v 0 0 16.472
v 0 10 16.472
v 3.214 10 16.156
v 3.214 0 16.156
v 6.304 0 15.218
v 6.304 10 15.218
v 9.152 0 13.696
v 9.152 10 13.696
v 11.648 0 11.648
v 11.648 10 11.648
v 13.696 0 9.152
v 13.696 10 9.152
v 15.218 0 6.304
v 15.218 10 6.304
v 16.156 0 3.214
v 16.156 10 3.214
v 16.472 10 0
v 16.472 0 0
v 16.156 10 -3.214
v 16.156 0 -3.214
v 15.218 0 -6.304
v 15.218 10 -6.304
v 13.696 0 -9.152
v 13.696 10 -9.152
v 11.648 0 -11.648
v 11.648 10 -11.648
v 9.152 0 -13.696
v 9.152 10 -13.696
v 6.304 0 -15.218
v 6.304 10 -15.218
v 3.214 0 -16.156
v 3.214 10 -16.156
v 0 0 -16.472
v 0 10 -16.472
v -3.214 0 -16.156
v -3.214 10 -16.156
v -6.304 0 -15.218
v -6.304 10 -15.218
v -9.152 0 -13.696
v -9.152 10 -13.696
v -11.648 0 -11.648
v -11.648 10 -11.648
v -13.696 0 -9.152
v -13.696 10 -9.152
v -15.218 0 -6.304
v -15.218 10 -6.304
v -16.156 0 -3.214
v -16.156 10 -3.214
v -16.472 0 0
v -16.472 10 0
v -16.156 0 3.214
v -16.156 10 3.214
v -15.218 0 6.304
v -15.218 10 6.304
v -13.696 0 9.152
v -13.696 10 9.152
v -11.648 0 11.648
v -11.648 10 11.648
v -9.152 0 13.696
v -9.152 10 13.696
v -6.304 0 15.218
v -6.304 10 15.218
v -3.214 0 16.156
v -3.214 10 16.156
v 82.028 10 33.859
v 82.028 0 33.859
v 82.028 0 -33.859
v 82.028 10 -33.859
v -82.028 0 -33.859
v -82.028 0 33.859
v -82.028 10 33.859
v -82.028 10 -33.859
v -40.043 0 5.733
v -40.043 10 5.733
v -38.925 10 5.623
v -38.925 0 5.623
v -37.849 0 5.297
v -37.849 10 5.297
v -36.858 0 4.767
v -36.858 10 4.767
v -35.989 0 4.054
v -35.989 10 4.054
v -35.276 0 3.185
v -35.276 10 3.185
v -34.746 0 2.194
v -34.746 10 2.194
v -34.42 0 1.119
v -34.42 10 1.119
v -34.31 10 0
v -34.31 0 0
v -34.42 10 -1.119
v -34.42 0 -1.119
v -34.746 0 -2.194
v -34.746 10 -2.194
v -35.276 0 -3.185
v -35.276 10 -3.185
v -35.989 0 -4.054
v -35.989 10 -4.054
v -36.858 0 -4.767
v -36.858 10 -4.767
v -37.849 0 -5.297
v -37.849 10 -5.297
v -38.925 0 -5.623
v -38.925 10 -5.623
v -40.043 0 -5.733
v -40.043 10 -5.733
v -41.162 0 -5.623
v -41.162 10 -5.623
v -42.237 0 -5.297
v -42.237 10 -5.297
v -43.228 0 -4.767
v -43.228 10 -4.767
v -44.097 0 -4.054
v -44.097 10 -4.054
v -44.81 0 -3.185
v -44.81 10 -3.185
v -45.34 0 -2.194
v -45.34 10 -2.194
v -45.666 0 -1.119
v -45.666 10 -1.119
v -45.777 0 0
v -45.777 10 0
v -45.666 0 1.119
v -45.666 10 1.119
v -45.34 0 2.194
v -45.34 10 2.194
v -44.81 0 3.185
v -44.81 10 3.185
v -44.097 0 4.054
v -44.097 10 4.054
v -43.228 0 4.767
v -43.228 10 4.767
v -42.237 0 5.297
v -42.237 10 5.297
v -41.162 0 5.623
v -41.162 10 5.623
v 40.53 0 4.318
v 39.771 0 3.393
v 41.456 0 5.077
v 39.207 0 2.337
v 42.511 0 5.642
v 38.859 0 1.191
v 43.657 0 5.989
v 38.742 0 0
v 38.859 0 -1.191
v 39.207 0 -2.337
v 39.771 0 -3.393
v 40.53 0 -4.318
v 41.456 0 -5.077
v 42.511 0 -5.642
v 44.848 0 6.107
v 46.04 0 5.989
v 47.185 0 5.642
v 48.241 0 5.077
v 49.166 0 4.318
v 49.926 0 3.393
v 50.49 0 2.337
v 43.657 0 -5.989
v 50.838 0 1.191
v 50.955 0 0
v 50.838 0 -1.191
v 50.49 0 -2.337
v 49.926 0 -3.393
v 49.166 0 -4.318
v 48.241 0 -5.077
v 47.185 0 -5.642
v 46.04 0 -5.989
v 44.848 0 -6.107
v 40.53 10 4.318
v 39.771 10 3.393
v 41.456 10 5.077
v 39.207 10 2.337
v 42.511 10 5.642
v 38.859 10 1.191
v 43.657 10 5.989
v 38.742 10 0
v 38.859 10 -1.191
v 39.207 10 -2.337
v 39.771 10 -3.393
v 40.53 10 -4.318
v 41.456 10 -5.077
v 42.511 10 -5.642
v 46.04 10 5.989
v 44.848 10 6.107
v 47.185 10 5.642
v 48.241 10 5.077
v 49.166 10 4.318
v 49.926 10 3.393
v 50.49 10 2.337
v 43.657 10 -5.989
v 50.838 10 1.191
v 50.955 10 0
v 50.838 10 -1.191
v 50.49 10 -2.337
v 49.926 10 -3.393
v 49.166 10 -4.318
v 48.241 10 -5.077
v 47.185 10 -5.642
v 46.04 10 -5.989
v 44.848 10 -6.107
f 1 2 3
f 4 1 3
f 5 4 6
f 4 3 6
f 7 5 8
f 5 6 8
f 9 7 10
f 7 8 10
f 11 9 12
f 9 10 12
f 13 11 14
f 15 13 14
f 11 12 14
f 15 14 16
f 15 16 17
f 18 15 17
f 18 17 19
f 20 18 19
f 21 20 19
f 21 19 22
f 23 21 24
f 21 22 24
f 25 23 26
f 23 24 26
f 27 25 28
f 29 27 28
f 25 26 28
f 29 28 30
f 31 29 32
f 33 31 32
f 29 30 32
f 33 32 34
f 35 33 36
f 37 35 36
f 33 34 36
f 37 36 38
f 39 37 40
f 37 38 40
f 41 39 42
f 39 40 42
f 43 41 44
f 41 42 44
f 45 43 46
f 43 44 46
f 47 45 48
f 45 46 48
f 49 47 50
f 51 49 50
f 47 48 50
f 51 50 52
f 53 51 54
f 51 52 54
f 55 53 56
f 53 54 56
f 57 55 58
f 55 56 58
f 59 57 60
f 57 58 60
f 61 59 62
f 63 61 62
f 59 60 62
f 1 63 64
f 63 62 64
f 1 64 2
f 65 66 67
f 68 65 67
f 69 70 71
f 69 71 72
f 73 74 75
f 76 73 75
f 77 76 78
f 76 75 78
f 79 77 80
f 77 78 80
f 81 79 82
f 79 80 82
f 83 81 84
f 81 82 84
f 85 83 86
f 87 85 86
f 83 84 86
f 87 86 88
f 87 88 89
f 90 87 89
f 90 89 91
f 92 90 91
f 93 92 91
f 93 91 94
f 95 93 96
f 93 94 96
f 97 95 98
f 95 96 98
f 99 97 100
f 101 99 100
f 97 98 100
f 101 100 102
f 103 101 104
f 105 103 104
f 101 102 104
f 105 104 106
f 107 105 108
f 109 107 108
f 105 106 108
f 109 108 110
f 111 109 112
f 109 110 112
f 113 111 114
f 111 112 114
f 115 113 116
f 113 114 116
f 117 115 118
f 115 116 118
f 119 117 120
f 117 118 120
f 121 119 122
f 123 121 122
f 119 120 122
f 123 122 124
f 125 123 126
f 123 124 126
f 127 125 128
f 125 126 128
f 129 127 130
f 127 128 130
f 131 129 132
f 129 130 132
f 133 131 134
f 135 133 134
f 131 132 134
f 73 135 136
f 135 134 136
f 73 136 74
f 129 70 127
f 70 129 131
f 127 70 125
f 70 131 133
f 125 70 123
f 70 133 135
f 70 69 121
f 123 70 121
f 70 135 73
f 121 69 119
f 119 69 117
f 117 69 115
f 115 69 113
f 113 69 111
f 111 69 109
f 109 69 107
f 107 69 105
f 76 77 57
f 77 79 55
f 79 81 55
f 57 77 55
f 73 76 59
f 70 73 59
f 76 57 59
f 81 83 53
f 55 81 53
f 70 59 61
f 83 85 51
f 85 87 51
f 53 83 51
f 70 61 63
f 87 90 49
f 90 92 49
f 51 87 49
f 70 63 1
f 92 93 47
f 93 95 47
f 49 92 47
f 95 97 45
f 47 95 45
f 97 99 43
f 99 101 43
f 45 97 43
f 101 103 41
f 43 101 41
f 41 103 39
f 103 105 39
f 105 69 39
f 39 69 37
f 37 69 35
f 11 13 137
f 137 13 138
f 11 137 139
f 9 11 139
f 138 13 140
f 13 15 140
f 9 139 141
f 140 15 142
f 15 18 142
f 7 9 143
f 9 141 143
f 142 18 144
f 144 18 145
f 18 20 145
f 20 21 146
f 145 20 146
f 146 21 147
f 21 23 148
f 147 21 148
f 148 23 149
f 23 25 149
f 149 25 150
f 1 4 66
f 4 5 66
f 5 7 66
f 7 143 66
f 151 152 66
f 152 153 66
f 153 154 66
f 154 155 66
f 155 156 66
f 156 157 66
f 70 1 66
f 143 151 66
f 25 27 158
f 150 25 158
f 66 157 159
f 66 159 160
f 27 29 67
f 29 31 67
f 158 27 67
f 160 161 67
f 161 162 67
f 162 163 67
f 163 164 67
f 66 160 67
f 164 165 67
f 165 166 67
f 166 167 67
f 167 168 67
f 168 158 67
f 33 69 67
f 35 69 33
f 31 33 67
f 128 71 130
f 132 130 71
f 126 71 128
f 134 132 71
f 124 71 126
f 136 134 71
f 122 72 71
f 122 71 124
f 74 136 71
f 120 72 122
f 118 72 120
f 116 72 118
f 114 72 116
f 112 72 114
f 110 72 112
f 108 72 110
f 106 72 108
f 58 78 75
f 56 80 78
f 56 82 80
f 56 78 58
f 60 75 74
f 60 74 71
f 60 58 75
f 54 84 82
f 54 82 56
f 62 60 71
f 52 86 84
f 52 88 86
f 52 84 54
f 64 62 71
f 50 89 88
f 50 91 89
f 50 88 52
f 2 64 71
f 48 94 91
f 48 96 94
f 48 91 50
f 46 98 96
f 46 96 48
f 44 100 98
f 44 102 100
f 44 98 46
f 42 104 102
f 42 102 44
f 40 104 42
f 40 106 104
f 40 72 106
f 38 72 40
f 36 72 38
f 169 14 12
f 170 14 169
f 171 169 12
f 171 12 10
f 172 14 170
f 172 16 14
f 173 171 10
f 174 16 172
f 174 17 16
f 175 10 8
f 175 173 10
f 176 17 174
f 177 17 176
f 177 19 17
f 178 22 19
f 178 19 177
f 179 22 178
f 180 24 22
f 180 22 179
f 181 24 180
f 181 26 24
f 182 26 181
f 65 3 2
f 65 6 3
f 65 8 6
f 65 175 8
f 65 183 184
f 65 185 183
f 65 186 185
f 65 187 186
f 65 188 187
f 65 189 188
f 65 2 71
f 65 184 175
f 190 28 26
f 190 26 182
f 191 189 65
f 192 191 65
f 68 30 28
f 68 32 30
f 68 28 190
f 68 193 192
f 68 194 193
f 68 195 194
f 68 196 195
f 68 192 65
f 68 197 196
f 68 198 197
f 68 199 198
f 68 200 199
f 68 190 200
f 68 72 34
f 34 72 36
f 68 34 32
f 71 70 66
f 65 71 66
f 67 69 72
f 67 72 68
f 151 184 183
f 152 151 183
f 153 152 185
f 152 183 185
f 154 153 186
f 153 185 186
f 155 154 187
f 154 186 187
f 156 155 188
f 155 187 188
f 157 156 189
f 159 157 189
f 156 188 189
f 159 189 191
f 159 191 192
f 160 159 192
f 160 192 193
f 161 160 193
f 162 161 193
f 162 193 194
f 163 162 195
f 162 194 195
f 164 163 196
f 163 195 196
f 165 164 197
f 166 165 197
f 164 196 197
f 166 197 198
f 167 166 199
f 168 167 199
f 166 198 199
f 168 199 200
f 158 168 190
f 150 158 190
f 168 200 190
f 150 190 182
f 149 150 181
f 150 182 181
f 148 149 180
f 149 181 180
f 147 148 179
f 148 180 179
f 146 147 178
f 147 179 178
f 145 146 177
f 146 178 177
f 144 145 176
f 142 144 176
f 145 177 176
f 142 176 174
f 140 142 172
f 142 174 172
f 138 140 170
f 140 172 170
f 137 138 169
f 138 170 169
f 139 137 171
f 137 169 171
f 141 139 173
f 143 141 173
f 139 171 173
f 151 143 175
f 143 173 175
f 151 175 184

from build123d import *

# Parameters (mm, degrees)
SKETCH1_W           = 164.056213182
SKETCH1_H           = 67.71790731
BOSS_EXTRUDE1_DEPTH = 10
SKETCH2_R           = 5.733448678
CUT_EXTRUDE1_DEPTH  = 10
SKETCH4_R           = 6.106577878
CUT_EXTRUDE2_DEPTH  = 10
SKETCH6_R           = 16.472289059
CUT_EXTRUDE3_DEPTH  = 10


with BuildPart() as part:
    # Sketch1 → Boss-Extrude1 (new body)
    with BuildSketch(Plane(origin=(0, 0, 0), x_dir=(1, 0, 0), z_dir=(0, 1, 0))):
        Rectangle(SKETCH1_W, SKETCH1_H)
    extrude(amount=BOSS_EXTRUDE1_DEPTH)

    # Sketch2 → Cut-Extrude1 (cut)
    with BuildSketch(Plane(origin=(0, 10, 0), x_dir=(1, 0, 0), z_dir=(0, 1, 0))):
        with Locations(Location((-40.043133624, 0, 0), (0, 0, 270))):
            Circle(SKETCH2_R)
    extrude(amount=-CUT_EXTRUDE1_DEPTH, mode=Mode.SUBTRACT)

    # Sketch4 → Cut-Extrude2 (cut)
    with BuildSketch(Plane(origin=(0, 10, 0), x_dir=(1, 0, 0), z_dir=(0, 1, 0))):
        with Locations(Location((44.848309659, 0, 0), (0, 0, 270))):
            Circle(SKETCH4_R)
    extrude(amount=-CUT_EXTRUDE2_DEPTH, mode=Mode.SUBTRACT)

    # Sketch6 → Cut-Extrude3 (cut)
    with BuildSketch(Plane(origin=(0, 10, 0), x_dir=(1, 0, 0), z_dir=(0, 1, 0))):
        with Locations(Location((0, 0, 0), (0, 0, 270))):
            Circle(SKETCH6_R)
    extrude(amount=-CUT_EXTRUDE3_DEPTH, mode=Mode.SUBTRACT)


solid = part.part
